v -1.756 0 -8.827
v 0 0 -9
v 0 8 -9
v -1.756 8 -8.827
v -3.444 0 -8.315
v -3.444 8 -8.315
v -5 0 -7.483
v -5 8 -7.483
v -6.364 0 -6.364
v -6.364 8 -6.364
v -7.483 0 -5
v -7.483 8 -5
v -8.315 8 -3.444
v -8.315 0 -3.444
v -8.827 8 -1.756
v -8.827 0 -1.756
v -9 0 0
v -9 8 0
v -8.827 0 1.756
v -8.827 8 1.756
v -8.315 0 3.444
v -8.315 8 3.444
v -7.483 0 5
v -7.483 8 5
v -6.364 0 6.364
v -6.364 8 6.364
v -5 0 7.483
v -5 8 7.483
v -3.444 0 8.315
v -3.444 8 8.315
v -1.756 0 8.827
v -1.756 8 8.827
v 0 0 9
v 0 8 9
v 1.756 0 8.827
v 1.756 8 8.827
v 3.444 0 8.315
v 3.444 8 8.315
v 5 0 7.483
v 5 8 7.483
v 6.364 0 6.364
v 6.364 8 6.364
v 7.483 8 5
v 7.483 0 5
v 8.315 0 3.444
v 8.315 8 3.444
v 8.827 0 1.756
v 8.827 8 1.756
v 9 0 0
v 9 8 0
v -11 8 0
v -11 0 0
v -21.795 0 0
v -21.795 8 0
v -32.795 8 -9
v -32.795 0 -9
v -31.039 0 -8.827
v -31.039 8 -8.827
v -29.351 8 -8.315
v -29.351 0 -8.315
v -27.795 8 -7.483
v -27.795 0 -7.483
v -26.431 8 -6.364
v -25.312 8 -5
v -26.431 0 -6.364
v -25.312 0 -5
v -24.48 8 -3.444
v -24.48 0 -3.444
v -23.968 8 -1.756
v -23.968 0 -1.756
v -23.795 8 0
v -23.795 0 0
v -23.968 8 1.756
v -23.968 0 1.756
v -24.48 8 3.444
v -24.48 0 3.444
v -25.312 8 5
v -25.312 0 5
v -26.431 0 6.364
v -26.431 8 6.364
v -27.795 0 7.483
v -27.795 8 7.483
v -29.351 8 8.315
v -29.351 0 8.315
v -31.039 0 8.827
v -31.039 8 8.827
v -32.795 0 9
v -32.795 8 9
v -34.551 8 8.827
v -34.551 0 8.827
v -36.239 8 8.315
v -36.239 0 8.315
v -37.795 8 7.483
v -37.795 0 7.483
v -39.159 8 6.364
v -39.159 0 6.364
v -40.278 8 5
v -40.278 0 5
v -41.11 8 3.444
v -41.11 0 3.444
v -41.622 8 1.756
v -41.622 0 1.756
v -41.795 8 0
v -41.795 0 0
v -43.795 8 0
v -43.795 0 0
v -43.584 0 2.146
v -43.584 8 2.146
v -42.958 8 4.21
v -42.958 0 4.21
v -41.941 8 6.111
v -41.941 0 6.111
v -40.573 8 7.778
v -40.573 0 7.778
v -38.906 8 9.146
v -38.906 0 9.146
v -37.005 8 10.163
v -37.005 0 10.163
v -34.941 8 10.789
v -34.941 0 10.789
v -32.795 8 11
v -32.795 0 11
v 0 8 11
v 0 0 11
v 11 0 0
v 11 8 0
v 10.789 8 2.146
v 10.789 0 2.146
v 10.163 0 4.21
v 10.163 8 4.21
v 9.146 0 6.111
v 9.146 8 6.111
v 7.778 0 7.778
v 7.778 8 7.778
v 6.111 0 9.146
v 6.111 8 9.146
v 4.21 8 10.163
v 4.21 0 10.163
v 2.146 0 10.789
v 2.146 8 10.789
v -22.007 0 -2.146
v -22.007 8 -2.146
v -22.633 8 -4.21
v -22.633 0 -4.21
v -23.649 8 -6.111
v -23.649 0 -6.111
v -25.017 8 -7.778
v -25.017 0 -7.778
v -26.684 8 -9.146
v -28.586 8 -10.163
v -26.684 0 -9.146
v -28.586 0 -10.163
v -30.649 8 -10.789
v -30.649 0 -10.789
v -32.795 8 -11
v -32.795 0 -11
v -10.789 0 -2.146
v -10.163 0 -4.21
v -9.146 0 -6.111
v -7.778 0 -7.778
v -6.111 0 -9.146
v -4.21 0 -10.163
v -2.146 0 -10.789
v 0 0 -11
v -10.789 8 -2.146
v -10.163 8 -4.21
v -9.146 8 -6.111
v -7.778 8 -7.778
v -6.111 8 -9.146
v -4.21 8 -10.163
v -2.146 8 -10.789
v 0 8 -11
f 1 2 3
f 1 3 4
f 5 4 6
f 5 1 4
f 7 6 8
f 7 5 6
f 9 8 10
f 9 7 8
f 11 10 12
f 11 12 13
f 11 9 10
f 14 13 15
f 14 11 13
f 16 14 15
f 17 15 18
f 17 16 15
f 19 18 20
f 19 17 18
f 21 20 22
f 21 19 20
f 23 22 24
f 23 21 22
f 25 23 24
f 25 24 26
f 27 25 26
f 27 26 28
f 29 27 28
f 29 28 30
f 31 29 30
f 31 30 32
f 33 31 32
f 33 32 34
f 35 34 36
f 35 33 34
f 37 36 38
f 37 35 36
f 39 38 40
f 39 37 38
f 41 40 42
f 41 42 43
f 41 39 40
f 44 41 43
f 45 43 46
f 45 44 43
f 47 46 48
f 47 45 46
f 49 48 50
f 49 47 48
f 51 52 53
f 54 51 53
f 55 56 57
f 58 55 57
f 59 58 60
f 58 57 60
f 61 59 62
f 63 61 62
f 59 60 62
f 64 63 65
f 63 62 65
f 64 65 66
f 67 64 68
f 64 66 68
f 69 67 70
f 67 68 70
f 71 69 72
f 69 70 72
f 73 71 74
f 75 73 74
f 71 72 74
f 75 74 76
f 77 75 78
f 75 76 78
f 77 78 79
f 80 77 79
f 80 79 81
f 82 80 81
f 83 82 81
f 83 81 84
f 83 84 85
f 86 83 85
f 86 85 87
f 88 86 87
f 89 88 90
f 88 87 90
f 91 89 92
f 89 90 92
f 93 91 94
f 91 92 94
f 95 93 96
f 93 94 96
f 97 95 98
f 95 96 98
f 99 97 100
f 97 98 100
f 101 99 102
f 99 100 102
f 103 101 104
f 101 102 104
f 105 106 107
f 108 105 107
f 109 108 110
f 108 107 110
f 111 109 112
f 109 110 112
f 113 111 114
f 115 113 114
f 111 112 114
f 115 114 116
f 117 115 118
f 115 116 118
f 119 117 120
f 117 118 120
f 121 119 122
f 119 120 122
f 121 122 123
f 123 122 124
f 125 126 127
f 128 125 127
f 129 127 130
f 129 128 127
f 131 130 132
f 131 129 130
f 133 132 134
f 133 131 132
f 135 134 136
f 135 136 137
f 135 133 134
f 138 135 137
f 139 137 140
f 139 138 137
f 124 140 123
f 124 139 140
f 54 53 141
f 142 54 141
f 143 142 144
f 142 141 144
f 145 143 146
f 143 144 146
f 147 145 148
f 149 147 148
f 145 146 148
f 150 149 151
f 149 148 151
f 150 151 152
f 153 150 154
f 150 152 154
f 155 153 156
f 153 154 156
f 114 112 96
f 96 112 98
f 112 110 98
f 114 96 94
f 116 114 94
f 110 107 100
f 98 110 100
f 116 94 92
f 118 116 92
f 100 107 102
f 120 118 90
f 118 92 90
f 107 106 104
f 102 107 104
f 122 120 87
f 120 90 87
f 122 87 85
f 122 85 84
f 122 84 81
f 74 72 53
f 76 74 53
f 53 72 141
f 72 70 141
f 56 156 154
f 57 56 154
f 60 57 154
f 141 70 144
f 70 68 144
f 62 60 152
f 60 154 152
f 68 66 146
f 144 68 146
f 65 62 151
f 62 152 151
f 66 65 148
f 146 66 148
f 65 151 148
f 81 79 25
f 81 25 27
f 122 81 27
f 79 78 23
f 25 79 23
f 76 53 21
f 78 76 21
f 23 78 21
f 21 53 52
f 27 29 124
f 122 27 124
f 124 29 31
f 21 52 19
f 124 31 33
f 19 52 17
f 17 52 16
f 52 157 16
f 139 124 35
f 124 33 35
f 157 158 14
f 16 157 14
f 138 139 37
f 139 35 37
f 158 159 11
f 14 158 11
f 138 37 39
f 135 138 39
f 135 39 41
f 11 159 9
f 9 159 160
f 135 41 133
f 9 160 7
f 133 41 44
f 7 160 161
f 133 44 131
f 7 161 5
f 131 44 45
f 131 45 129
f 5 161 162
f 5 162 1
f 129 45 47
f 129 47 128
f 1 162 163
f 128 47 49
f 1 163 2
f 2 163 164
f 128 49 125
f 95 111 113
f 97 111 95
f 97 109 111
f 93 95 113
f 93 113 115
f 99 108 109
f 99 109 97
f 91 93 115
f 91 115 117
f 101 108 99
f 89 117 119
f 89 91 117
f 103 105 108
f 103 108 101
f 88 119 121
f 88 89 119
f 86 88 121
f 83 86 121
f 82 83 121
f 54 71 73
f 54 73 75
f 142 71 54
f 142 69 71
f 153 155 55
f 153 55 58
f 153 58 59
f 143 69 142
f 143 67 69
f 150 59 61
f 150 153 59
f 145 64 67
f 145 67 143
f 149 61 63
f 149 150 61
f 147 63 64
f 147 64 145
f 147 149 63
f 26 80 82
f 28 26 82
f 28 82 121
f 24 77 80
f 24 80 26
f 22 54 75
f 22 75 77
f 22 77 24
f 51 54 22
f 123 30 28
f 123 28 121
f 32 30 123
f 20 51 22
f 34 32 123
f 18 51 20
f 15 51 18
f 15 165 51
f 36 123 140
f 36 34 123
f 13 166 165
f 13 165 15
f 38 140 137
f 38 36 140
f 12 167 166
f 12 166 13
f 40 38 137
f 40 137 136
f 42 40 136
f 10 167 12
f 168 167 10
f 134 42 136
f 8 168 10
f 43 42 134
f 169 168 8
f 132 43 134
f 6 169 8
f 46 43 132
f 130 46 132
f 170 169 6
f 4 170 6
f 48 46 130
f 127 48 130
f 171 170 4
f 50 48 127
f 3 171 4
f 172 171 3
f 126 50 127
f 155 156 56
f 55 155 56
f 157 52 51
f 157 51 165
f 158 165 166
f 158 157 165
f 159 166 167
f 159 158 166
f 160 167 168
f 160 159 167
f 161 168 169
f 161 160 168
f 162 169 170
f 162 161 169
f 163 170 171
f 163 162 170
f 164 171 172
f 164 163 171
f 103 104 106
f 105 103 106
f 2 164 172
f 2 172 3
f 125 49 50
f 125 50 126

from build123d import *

# Parameters (mm, degrees)
BOSS_EXTRUDE1_DEPTH = 8


with BuildPart() as part:
    # Sketch1 → Boss-Extrude1 (new body)
    with BuildSketch(Plane(origin=(0, 0, 0), x_dir=(1, 0, 0), z_dir=(0, 1, 0))):
        with BuildLine():
            ThreePointArc((-43.795204124, 0), (-25.017029531, -7.778174593), (-32.795204124, 11))
            Line((-32.795204124, 11), (-32.795204124, 9))
            ThreePointArc((-32.795204124, 9), (-26.431243094, -6.363961031), (-41.795204124, 0))
            Line((-41.795204124, 0), (-43.795204124, 0))
        make_face()
        with BuildLine():
            Line((-16.397602062, -11), (-16.397602062, 0))
            Line((-16.397602062, 0), (-21.795204124, 0))
            ThreePointArc((-21.795204124, 0), (-25.017029531, -7.778174593), (-32.795204124, -11))
            Line((-32.795204124, -11), (-16.397602062, -11))
        make_face()
        with BuildLine():
            ThreePointArc((0, -11), (-7.778174593, -7.778174593), (-11, 0))
            Line((-11, 0), (-16.397602062, 0))
            Line((-16.397602062, 0), (-16.397602062, -11))
            Line((-16.397602062, -11), (0, -11))
        make_face()
        with BuildLine():
            ThreePointArc((11, 0), (-7.778174593, -7.778174593), (0, 11))
            Line((0, 11), (0, 9))
            ThreePointArc((0, 9), (-6.363961031, -6.363961031), (9, 0))
            Line((9, 0), (11, 0))
        make_face()
    extrude(amount=BOSS_EXTRUDE1_DEPTH)


solid = part.part
